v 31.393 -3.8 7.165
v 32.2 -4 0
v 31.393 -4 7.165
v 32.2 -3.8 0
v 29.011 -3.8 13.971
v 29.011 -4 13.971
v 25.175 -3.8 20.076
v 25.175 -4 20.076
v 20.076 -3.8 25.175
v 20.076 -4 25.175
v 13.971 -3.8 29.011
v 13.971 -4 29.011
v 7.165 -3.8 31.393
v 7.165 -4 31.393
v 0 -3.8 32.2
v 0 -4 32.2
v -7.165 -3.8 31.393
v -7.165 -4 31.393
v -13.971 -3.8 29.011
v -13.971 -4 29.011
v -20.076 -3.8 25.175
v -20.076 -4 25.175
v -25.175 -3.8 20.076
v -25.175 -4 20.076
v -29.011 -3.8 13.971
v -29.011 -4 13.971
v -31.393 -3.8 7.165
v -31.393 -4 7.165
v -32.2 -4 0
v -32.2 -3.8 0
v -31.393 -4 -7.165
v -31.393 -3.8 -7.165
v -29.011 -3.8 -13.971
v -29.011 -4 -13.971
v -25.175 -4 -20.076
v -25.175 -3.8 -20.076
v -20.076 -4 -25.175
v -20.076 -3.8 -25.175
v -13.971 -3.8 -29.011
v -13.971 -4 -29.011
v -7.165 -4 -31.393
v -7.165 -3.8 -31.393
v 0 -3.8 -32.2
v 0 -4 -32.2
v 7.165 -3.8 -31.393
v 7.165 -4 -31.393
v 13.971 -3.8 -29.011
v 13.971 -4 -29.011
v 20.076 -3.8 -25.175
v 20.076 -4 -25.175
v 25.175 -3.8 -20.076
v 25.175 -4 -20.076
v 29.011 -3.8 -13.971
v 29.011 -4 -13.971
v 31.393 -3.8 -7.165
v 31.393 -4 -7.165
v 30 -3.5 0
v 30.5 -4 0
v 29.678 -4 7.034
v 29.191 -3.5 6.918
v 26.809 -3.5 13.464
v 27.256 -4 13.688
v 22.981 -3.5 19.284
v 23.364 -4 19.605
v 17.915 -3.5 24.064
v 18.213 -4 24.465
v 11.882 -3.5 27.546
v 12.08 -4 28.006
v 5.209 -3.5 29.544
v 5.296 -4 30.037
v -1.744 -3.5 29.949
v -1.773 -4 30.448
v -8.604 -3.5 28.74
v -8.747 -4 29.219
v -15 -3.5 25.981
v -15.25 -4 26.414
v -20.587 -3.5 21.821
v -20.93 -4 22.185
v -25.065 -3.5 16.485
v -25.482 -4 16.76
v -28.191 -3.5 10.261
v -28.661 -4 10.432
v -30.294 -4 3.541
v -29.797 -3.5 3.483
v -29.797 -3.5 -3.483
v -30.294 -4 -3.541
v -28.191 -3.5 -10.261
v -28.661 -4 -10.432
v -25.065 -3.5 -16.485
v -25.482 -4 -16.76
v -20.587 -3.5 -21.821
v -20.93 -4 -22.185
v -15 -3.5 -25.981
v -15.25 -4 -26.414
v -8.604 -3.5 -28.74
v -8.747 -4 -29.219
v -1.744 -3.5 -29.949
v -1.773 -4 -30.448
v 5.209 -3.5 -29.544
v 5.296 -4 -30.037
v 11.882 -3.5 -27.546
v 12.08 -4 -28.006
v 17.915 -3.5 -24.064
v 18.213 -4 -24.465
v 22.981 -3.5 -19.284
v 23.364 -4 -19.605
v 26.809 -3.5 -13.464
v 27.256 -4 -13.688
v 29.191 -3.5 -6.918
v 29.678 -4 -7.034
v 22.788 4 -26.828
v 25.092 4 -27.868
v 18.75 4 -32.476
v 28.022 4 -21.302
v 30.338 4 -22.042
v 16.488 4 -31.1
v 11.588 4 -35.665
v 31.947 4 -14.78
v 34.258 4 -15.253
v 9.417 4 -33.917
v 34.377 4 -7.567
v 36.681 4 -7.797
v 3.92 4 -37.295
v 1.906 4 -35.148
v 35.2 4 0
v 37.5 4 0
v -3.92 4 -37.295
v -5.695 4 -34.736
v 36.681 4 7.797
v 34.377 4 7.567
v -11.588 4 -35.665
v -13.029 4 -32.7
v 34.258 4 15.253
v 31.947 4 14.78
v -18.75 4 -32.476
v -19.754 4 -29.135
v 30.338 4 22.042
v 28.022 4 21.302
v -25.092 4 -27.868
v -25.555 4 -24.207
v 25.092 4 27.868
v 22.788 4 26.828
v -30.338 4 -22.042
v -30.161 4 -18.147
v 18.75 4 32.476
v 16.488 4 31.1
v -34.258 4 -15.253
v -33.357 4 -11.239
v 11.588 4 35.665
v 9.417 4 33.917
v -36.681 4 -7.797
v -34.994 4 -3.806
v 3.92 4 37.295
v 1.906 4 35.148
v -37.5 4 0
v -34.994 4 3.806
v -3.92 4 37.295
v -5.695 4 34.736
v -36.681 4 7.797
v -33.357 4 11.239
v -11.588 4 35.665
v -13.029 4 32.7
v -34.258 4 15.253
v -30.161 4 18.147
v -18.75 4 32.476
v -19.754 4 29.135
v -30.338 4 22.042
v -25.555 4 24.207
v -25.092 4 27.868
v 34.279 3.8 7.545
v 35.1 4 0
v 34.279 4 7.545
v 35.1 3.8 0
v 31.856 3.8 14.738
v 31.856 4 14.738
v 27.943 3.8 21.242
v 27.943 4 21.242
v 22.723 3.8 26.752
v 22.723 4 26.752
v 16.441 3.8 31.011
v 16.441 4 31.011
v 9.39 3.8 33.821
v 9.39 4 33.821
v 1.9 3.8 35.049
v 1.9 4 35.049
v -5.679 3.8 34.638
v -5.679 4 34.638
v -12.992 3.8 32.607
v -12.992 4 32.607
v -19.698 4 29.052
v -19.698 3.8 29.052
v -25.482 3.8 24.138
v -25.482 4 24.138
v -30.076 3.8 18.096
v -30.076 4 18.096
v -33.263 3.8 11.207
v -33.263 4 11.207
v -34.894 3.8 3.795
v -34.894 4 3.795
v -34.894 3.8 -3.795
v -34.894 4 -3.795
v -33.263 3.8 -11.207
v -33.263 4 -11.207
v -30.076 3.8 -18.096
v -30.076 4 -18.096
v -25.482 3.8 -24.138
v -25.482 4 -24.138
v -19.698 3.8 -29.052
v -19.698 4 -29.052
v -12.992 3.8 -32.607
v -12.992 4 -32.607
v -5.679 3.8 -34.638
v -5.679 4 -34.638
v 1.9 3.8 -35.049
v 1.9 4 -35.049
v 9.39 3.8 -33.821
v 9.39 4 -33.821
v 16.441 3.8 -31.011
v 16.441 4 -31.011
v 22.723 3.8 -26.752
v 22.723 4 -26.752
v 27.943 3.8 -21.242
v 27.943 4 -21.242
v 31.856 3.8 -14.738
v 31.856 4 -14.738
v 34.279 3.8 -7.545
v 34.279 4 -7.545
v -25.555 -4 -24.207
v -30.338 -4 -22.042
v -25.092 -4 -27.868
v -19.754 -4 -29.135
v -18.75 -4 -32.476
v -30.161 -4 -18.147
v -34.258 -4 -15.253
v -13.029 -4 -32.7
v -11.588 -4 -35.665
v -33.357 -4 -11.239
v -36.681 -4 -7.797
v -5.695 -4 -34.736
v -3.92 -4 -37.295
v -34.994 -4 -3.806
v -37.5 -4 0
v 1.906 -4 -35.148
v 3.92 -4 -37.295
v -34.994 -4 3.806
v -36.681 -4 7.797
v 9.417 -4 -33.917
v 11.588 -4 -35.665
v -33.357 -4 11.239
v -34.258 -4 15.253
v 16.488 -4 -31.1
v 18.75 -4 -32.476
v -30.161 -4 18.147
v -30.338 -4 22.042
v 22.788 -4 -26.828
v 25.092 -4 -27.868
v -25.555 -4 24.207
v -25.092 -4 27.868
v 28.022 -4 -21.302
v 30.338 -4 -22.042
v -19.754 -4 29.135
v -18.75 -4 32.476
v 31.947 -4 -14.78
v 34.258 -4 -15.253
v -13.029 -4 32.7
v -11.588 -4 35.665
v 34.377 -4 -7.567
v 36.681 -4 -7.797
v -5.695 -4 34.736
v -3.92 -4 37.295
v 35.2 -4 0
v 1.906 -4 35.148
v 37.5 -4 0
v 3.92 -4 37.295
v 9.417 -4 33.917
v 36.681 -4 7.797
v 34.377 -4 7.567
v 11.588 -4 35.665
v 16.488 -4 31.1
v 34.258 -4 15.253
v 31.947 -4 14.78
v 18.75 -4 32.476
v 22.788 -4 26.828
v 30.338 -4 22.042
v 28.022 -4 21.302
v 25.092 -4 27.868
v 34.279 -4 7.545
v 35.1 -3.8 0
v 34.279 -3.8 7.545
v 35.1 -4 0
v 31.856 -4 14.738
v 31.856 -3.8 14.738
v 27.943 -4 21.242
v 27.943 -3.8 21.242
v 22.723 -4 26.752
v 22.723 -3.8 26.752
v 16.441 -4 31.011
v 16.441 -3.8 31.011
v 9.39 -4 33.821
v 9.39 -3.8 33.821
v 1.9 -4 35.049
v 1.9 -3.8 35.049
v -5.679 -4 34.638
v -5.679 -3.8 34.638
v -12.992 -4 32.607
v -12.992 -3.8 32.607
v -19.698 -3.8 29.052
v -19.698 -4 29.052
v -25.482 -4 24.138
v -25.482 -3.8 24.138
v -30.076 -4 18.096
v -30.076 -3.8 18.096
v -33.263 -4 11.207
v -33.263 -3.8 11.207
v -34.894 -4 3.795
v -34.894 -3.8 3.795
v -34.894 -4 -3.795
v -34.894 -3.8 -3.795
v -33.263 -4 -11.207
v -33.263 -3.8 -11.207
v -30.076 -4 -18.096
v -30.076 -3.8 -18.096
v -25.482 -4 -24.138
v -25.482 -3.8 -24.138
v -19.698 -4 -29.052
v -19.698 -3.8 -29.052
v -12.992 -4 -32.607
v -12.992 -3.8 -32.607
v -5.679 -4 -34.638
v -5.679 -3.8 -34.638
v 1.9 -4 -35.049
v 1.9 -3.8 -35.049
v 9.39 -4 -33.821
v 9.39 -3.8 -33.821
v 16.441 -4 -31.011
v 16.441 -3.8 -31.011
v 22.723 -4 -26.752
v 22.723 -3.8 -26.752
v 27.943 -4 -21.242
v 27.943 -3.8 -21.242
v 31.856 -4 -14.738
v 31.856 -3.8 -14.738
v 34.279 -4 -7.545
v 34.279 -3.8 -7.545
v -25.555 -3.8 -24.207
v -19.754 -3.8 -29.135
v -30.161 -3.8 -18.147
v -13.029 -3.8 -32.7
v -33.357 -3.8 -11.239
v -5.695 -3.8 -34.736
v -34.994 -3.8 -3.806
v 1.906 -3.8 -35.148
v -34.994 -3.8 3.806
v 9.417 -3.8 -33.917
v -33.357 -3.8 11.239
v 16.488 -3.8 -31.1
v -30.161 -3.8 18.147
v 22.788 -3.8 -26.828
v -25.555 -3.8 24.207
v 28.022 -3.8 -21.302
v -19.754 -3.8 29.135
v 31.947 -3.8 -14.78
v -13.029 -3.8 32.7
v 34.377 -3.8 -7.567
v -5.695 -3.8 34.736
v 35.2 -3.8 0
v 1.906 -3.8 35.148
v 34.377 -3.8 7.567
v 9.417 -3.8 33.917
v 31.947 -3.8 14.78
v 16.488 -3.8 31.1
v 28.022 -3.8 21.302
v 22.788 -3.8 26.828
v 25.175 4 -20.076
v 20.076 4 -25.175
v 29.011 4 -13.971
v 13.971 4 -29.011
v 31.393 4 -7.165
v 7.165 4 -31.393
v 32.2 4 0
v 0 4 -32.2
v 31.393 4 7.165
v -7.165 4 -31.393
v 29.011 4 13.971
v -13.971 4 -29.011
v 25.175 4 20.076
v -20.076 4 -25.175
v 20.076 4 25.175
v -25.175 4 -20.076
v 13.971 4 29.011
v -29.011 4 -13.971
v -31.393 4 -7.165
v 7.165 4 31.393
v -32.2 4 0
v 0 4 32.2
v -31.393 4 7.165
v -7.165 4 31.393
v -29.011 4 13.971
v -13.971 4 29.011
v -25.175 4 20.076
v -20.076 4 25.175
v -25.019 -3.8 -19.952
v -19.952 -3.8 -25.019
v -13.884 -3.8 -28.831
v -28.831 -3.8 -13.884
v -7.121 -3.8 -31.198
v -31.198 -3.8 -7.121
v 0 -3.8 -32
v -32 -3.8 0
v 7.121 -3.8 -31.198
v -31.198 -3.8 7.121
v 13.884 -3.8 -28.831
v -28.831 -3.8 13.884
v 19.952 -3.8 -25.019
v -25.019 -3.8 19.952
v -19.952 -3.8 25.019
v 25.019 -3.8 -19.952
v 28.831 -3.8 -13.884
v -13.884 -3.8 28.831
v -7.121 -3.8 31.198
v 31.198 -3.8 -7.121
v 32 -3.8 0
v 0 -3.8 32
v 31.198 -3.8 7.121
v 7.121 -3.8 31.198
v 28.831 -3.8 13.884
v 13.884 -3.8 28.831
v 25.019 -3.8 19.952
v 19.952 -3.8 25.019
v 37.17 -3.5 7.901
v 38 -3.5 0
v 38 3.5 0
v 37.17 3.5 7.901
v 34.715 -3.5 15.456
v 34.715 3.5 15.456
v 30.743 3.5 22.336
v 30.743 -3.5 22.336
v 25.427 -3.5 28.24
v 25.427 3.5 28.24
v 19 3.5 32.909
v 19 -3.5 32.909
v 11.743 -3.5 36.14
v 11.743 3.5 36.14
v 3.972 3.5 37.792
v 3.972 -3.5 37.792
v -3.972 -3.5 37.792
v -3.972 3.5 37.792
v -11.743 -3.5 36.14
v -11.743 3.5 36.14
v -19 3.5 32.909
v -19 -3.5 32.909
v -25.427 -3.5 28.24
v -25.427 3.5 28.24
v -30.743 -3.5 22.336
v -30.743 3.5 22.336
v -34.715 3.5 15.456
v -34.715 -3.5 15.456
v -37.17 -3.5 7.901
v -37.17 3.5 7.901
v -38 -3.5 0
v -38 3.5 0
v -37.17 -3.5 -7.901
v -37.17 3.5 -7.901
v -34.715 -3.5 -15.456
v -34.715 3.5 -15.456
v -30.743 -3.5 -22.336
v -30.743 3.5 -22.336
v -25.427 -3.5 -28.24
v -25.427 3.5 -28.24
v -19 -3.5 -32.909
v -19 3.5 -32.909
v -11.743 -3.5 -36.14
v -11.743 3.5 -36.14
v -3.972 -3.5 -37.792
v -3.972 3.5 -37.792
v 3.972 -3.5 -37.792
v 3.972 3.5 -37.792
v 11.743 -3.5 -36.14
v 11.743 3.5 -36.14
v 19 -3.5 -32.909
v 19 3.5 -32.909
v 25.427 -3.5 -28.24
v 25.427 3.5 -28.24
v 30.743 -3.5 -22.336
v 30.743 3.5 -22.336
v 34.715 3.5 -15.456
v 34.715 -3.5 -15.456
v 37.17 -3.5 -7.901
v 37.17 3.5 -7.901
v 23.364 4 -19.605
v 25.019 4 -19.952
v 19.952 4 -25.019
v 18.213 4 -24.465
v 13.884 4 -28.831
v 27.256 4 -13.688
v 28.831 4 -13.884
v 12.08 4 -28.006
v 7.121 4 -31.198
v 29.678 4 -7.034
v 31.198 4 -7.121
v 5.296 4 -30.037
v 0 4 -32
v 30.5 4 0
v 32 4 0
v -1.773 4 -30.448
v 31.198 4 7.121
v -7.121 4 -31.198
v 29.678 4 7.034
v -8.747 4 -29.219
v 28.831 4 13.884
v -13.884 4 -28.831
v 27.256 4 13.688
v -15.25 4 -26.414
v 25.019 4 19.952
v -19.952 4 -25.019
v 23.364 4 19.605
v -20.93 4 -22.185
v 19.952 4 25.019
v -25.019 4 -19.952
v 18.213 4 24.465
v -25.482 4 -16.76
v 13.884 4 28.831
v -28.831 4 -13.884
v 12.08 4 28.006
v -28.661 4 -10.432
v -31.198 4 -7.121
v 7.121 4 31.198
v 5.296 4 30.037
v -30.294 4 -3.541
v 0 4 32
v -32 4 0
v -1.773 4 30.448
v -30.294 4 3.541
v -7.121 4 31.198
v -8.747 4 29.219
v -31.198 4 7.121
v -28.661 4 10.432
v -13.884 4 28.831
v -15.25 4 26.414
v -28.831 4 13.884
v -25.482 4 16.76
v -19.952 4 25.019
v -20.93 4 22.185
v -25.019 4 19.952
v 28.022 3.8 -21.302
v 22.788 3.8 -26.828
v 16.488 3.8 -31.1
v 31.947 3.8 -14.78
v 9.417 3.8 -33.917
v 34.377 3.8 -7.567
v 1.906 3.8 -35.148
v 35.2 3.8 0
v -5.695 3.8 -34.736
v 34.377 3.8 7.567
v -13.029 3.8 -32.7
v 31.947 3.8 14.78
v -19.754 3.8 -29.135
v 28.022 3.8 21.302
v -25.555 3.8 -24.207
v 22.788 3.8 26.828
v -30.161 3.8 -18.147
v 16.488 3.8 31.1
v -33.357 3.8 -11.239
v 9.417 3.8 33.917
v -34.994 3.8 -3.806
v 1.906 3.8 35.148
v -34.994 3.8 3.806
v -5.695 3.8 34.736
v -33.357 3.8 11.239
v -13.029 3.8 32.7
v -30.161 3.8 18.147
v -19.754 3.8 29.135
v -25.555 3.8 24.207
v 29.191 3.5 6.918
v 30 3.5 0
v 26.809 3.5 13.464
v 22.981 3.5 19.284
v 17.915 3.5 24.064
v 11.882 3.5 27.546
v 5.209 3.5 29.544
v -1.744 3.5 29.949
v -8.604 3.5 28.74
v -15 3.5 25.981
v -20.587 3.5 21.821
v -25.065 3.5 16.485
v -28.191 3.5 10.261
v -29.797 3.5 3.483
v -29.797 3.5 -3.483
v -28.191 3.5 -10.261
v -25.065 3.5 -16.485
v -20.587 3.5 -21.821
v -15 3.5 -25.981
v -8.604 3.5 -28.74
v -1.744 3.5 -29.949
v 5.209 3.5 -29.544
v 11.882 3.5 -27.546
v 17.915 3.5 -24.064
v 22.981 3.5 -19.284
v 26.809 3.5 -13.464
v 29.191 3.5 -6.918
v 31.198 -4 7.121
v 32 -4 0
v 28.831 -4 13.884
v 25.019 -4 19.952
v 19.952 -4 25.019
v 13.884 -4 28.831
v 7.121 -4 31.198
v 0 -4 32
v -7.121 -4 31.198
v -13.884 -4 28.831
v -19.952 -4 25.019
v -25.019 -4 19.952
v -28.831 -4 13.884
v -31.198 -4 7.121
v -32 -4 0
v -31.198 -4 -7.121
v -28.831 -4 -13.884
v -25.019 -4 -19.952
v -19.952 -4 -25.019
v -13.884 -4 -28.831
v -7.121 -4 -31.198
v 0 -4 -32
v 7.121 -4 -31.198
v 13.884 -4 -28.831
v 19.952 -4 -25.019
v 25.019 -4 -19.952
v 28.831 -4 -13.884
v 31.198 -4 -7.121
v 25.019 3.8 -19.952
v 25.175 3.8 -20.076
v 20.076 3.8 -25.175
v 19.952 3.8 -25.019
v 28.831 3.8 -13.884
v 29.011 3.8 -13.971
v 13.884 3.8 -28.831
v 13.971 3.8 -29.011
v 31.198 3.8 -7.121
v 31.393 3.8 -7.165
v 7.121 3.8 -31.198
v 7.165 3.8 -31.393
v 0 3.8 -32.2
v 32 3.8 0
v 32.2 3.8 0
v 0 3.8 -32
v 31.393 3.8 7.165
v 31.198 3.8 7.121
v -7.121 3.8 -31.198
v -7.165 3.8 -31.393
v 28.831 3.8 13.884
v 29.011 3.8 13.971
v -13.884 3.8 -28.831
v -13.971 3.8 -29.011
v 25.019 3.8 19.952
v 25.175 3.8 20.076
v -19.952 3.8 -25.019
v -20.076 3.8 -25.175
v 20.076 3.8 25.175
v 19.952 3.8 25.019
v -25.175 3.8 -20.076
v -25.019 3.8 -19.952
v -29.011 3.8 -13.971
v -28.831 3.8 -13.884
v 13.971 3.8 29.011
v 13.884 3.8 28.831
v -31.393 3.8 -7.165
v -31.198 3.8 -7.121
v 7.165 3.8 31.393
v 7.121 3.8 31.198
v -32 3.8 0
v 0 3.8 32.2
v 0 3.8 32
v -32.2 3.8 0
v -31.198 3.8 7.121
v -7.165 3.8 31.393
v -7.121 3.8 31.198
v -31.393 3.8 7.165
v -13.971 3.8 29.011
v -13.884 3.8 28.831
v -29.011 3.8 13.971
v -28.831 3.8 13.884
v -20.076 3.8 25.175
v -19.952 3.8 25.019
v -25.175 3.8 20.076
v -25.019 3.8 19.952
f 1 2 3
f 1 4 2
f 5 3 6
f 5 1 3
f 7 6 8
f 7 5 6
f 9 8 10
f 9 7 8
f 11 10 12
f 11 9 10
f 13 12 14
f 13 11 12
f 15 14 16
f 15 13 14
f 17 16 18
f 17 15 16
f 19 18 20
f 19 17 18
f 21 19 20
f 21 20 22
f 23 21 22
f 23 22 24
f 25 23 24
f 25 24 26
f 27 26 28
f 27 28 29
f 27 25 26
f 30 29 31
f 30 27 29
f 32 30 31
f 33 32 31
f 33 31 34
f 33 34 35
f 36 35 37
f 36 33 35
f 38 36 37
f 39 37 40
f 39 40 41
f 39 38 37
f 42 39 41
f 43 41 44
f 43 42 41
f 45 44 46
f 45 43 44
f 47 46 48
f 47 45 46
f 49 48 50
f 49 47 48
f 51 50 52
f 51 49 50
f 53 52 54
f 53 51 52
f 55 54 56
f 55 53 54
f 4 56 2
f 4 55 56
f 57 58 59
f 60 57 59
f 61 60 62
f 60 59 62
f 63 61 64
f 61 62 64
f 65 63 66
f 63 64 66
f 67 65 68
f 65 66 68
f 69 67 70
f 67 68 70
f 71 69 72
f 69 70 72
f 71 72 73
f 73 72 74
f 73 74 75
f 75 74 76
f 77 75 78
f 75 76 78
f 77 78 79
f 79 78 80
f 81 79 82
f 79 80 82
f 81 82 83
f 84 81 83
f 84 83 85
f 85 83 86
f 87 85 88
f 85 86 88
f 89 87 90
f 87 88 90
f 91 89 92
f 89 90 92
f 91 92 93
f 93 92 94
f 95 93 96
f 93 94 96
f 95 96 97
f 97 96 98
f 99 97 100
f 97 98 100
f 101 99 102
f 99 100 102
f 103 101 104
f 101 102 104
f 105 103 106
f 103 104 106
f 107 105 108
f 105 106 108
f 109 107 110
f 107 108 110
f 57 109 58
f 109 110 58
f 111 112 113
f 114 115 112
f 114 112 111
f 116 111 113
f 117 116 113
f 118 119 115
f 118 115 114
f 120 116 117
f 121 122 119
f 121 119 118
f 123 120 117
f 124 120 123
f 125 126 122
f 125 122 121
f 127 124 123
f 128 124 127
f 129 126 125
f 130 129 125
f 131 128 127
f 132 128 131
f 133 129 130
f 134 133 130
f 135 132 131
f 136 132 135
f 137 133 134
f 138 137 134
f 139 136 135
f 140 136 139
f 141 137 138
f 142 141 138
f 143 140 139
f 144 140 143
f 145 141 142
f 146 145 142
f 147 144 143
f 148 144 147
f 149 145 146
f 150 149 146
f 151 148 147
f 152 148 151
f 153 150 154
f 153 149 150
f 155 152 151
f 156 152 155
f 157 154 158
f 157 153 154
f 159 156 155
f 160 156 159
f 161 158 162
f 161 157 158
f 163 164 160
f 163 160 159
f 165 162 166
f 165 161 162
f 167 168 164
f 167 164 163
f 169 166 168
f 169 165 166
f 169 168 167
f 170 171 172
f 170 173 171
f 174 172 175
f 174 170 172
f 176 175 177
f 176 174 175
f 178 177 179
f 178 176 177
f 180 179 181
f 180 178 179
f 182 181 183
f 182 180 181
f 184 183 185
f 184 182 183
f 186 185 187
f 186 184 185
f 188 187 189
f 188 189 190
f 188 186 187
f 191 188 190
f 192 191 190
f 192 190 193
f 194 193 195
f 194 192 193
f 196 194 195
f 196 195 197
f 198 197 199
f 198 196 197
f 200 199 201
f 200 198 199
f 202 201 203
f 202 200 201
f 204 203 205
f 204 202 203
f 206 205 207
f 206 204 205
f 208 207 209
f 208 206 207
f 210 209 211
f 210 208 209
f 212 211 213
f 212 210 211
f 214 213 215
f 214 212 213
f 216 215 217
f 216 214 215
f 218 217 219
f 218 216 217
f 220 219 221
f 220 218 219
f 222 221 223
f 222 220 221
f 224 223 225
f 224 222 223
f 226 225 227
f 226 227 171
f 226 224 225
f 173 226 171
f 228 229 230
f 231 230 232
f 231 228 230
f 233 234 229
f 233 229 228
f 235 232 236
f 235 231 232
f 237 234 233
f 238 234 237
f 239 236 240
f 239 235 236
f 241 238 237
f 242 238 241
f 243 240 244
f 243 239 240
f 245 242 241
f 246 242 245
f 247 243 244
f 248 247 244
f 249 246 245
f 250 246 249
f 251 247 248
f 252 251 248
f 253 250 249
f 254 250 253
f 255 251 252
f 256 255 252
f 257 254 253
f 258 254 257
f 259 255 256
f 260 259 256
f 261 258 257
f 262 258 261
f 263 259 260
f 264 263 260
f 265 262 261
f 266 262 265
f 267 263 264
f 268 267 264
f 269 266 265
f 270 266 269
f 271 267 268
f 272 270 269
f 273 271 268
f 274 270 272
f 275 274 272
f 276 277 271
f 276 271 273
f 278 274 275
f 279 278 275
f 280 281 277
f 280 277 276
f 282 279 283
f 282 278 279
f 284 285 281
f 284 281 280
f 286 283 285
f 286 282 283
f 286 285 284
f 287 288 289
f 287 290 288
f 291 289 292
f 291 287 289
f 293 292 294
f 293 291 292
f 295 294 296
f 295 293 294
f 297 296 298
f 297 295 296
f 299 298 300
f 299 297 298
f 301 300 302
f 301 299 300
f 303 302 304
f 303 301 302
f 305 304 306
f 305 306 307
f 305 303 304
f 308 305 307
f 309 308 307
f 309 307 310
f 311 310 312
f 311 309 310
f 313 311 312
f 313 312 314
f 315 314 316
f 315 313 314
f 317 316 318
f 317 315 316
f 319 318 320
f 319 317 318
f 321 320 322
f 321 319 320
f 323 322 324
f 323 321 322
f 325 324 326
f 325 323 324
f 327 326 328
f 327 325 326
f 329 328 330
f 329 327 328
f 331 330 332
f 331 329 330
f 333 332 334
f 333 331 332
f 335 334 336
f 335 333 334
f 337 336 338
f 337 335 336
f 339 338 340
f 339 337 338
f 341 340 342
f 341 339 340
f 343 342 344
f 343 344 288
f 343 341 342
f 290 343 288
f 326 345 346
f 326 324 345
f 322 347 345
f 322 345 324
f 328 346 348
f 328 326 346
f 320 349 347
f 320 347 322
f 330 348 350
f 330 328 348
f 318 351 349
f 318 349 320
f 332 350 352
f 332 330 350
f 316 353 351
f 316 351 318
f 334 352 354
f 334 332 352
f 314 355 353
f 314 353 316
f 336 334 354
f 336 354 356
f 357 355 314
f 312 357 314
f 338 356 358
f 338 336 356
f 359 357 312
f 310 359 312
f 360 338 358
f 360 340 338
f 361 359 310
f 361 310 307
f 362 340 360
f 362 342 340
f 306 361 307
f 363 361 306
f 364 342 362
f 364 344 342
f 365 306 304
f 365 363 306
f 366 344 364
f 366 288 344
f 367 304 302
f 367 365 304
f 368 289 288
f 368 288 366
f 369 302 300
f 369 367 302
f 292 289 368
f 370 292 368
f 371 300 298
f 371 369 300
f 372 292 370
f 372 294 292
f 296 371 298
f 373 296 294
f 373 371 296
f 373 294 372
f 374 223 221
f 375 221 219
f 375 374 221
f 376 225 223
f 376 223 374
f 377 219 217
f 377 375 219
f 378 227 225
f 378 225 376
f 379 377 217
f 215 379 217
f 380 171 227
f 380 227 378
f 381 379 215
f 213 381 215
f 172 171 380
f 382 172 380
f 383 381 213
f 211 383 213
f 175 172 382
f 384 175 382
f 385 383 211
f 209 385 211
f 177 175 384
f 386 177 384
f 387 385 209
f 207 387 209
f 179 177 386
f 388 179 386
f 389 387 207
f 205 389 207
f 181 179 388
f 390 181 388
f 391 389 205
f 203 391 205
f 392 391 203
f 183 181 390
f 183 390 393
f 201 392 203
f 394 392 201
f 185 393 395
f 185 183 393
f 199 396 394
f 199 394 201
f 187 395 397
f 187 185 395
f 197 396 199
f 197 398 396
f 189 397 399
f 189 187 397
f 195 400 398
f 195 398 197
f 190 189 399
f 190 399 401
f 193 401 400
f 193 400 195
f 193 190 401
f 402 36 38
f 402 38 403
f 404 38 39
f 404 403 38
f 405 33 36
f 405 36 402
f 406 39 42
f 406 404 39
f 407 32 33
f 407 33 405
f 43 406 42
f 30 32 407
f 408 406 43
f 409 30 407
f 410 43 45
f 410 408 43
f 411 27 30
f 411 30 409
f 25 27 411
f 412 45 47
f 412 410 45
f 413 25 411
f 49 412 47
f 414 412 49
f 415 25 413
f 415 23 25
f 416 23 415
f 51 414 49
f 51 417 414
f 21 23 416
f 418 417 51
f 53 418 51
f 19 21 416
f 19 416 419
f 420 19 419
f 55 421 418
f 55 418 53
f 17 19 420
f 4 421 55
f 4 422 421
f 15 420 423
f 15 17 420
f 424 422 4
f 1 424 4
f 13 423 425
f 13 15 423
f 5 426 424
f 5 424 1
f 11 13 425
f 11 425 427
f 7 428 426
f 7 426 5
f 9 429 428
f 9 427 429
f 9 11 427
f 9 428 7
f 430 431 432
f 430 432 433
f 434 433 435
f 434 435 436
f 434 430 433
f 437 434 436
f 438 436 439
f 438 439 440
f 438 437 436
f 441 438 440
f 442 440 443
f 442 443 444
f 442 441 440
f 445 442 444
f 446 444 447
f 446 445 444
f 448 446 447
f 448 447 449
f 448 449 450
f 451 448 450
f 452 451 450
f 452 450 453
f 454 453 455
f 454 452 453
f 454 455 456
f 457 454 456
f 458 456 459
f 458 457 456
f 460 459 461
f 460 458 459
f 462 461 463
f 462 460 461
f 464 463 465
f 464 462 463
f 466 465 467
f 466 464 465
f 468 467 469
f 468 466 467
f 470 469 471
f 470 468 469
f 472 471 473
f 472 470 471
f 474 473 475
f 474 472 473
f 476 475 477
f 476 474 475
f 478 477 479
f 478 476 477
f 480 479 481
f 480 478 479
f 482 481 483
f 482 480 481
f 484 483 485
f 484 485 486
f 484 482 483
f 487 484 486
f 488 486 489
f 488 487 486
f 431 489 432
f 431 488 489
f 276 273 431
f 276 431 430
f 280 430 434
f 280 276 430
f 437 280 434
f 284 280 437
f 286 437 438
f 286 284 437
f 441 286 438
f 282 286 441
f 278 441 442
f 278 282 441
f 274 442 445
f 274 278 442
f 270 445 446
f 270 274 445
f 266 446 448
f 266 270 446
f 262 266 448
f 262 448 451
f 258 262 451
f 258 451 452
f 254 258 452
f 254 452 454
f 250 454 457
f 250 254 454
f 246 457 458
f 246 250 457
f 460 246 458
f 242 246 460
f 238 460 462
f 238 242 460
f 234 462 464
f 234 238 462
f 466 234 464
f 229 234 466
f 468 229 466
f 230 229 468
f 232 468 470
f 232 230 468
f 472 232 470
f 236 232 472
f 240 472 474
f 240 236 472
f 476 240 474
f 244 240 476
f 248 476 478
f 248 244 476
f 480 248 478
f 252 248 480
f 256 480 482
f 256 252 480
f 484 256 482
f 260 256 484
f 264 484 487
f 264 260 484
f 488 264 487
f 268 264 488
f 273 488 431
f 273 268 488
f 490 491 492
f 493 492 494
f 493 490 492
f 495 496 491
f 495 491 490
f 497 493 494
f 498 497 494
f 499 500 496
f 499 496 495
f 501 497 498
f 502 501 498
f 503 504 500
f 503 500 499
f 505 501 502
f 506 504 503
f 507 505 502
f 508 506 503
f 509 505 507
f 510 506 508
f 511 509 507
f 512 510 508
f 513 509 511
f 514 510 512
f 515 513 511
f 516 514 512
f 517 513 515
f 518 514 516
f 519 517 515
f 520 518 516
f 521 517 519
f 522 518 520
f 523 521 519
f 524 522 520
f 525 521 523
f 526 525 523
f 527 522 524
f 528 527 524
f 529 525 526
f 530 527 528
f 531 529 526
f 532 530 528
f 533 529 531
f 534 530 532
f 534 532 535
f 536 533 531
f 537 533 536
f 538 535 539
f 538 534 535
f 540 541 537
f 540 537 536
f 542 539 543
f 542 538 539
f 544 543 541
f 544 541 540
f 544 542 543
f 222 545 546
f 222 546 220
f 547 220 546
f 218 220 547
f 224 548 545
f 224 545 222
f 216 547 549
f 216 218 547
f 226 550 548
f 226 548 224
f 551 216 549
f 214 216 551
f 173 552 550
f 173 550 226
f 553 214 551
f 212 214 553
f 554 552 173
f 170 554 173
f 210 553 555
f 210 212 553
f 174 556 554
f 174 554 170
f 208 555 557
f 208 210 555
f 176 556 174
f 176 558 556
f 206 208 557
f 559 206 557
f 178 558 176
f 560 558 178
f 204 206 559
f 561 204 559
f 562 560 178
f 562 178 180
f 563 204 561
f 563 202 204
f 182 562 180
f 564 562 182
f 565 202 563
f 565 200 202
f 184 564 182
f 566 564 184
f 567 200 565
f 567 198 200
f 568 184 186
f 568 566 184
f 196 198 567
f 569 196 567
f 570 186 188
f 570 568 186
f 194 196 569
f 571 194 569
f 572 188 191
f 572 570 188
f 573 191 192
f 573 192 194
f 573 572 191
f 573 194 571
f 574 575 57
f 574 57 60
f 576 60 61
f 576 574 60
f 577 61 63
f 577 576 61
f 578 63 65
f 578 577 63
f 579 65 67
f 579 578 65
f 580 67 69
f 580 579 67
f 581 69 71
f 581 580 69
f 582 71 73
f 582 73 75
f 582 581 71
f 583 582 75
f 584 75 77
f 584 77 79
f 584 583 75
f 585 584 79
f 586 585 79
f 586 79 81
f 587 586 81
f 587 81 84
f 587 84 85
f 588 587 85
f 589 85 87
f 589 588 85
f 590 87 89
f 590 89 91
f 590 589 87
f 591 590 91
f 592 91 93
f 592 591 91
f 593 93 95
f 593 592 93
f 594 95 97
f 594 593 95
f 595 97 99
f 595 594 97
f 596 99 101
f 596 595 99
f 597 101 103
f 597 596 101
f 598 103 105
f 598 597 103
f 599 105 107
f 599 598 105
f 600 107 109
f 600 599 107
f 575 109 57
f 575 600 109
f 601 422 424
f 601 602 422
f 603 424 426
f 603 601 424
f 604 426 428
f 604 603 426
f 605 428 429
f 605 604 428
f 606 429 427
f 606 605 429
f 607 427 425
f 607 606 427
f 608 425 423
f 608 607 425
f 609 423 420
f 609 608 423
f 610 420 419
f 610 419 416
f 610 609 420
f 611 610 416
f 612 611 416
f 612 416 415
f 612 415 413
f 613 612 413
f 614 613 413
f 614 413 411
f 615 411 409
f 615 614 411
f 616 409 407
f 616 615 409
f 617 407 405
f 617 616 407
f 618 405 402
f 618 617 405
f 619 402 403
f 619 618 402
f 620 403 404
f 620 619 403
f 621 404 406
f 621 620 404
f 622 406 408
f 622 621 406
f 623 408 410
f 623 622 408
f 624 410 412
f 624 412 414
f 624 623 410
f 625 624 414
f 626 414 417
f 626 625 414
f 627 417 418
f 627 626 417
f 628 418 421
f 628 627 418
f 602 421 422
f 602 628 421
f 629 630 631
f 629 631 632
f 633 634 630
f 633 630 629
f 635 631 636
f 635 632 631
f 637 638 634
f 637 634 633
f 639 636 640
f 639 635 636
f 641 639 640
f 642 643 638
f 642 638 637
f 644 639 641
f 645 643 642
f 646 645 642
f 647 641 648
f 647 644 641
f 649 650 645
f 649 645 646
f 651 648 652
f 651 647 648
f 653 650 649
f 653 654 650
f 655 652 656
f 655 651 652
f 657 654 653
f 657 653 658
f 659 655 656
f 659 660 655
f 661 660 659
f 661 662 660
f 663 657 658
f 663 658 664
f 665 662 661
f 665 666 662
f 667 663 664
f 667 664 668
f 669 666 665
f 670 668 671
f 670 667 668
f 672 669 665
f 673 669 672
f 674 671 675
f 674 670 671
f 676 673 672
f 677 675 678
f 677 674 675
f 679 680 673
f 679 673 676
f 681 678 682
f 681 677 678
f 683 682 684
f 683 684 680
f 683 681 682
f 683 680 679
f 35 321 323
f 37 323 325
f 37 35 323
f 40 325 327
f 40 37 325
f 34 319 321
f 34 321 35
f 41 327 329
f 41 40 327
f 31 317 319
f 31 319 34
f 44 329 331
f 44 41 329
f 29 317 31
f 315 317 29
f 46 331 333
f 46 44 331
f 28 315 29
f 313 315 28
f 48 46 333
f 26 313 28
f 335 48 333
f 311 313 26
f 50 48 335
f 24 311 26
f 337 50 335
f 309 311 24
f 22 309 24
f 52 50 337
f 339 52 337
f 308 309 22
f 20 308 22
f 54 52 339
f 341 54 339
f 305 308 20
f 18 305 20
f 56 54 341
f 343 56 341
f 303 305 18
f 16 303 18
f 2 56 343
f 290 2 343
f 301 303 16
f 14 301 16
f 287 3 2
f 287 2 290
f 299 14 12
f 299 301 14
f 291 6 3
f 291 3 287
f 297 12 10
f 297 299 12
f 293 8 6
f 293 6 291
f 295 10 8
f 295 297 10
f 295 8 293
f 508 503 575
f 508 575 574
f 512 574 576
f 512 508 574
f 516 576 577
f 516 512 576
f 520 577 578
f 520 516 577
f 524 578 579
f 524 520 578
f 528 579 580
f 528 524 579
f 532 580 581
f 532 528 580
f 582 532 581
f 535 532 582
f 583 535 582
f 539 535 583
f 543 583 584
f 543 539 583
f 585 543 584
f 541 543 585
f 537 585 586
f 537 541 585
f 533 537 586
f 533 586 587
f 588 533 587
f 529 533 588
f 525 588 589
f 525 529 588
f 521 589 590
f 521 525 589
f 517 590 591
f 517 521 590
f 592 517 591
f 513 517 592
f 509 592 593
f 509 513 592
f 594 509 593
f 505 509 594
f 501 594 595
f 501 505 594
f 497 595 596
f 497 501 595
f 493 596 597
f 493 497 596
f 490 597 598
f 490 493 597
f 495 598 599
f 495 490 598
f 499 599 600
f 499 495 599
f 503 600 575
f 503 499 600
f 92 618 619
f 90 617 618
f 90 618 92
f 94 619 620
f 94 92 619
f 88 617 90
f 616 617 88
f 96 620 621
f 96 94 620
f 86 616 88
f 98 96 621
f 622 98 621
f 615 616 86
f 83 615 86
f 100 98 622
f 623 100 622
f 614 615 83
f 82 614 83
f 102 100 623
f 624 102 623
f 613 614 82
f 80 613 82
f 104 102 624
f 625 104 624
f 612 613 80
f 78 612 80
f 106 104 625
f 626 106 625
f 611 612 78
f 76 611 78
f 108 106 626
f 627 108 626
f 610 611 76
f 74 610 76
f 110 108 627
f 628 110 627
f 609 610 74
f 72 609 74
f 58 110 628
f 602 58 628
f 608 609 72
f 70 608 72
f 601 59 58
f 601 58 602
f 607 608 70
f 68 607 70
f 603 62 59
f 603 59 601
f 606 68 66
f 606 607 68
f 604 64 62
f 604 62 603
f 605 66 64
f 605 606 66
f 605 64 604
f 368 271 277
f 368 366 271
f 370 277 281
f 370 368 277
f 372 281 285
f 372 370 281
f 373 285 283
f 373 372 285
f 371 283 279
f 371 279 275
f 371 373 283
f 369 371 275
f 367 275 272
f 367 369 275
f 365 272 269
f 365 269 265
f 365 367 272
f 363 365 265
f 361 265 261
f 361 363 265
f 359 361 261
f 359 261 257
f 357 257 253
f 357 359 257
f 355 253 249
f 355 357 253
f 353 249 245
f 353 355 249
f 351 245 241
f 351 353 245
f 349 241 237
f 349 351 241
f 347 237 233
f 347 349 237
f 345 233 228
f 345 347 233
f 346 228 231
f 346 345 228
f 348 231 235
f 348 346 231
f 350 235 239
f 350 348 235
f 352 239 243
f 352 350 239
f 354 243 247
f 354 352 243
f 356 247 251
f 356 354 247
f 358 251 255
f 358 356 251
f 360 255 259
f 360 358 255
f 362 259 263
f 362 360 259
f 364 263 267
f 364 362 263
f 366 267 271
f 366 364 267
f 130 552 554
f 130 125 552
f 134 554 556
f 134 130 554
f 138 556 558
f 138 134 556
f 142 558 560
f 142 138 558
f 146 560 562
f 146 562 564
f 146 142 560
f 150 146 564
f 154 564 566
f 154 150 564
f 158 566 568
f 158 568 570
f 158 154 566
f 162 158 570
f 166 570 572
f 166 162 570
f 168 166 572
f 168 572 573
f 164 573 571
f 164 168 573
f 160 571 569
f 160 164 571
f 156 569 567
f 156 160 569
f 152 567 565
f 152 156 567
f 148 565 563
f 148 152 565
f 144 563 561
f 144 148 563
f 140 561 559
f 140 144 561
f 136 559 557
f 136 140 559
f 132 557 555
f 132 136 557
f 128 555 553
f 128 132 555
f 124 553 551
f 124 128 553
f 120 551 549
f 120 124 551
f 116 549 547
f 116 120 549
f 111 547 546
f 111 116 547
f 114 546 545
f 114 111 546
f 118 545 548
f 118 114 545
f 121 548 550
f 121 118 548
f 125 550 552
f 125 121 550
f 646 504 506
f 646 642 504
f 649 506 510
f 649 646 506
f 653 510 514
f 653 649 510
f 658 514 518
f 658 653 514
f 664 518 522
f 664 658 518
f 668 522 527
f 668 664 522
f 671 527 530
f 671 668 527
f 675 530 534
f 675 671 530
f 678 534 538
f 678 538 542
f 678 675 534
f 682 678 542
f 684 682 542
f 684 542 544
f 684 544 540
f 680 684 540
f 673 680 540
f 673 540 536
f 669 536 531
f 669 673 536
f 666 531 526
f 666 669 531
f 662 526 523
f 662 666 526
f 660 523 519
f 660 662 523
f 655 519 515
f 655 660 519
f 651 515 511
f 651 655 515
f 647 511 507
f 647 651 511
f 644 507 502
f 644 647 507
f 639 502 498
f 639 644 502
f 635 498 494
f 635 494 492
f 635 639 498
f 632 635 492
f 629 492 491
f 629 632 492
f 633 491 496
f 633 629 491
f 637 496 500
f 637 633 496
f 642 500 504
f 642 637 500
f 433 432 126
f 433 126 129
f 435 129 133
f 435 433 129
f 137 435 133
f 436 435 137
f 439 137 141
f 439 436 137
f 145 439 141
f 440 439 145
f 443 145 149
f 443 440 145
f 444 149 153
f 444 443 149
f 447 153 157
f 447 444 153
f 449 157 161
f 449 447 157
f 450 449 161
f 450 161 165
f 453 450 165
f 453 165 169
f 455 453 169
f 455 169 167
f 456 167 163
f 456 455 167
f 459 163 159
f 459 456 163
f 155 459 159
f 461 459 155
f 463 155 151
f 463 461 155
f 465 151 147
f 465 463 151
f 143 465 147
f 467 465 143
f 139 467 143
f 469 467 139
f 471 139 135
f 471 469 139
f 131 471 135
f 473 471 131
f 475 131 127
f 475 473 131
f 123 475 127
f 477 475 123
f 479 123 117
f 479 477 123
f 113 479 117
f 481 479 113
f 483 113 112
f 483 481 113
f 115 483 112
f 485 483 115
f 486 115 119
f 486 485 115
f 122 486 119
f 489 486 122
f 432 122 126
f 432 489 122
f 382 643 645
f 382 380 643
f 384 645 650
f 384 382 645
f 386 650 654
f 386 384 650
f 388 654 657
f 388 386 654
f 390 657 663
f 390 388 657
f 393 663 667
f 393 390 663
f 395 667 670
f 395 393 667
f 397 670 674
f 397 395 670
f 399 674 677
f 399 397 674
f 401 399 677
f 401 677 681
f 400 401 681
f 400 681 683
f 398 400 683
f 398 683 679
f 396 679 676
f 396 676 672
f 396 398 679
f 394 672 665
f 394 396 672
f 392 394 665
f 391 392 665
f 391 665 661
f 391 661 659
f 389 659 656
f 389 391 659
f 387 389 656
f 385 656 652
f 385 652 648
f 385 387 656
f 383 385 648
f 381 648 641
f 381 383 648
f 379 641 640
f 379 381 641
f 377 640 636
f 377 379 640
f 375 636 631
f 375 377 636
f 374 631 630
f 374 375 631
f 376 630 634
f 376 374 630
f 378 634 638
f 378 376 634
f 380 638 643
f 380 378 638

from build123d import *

# Parameters (mm, degrees)
CHAMFER_1_SIZE = 0.5


with BuildPart() as part:
    # 草图1 → 旋转1 (revolve)
    with BuildSketch(Plane.XY):
        Polygon((30, -4), (30, 4), (32, 4), (32, 3.8), (32.2, 3.8), (32.2, 4), (35.1, 4), (35.1, 3.8), (35.2, 3.8), (35.2, 4), (38, 4), (38, -4), (35.2, -4), (35.2, -3.8), (35.1, -3.8), (35.1, -4), (32.2, -4), (32.2, -3.8), (32, -3.8), (32, -4), align=None)
    revolve(axis=Axis((0, 60.459632728, 0), (0, -1, 0)))

    # 倒角1
    chamfer_1_edges = [part.edges().sort_by_distance(p)[0] for p in [
        (-38, 4, 0),
        (-38, -4, 0),
        (-30, -4, 0),
        (-30, 4, 0),
    ]]
    chamfer(chamfer_1_edges, length=CHAMFER_1_SIZE)


solid = part.part
